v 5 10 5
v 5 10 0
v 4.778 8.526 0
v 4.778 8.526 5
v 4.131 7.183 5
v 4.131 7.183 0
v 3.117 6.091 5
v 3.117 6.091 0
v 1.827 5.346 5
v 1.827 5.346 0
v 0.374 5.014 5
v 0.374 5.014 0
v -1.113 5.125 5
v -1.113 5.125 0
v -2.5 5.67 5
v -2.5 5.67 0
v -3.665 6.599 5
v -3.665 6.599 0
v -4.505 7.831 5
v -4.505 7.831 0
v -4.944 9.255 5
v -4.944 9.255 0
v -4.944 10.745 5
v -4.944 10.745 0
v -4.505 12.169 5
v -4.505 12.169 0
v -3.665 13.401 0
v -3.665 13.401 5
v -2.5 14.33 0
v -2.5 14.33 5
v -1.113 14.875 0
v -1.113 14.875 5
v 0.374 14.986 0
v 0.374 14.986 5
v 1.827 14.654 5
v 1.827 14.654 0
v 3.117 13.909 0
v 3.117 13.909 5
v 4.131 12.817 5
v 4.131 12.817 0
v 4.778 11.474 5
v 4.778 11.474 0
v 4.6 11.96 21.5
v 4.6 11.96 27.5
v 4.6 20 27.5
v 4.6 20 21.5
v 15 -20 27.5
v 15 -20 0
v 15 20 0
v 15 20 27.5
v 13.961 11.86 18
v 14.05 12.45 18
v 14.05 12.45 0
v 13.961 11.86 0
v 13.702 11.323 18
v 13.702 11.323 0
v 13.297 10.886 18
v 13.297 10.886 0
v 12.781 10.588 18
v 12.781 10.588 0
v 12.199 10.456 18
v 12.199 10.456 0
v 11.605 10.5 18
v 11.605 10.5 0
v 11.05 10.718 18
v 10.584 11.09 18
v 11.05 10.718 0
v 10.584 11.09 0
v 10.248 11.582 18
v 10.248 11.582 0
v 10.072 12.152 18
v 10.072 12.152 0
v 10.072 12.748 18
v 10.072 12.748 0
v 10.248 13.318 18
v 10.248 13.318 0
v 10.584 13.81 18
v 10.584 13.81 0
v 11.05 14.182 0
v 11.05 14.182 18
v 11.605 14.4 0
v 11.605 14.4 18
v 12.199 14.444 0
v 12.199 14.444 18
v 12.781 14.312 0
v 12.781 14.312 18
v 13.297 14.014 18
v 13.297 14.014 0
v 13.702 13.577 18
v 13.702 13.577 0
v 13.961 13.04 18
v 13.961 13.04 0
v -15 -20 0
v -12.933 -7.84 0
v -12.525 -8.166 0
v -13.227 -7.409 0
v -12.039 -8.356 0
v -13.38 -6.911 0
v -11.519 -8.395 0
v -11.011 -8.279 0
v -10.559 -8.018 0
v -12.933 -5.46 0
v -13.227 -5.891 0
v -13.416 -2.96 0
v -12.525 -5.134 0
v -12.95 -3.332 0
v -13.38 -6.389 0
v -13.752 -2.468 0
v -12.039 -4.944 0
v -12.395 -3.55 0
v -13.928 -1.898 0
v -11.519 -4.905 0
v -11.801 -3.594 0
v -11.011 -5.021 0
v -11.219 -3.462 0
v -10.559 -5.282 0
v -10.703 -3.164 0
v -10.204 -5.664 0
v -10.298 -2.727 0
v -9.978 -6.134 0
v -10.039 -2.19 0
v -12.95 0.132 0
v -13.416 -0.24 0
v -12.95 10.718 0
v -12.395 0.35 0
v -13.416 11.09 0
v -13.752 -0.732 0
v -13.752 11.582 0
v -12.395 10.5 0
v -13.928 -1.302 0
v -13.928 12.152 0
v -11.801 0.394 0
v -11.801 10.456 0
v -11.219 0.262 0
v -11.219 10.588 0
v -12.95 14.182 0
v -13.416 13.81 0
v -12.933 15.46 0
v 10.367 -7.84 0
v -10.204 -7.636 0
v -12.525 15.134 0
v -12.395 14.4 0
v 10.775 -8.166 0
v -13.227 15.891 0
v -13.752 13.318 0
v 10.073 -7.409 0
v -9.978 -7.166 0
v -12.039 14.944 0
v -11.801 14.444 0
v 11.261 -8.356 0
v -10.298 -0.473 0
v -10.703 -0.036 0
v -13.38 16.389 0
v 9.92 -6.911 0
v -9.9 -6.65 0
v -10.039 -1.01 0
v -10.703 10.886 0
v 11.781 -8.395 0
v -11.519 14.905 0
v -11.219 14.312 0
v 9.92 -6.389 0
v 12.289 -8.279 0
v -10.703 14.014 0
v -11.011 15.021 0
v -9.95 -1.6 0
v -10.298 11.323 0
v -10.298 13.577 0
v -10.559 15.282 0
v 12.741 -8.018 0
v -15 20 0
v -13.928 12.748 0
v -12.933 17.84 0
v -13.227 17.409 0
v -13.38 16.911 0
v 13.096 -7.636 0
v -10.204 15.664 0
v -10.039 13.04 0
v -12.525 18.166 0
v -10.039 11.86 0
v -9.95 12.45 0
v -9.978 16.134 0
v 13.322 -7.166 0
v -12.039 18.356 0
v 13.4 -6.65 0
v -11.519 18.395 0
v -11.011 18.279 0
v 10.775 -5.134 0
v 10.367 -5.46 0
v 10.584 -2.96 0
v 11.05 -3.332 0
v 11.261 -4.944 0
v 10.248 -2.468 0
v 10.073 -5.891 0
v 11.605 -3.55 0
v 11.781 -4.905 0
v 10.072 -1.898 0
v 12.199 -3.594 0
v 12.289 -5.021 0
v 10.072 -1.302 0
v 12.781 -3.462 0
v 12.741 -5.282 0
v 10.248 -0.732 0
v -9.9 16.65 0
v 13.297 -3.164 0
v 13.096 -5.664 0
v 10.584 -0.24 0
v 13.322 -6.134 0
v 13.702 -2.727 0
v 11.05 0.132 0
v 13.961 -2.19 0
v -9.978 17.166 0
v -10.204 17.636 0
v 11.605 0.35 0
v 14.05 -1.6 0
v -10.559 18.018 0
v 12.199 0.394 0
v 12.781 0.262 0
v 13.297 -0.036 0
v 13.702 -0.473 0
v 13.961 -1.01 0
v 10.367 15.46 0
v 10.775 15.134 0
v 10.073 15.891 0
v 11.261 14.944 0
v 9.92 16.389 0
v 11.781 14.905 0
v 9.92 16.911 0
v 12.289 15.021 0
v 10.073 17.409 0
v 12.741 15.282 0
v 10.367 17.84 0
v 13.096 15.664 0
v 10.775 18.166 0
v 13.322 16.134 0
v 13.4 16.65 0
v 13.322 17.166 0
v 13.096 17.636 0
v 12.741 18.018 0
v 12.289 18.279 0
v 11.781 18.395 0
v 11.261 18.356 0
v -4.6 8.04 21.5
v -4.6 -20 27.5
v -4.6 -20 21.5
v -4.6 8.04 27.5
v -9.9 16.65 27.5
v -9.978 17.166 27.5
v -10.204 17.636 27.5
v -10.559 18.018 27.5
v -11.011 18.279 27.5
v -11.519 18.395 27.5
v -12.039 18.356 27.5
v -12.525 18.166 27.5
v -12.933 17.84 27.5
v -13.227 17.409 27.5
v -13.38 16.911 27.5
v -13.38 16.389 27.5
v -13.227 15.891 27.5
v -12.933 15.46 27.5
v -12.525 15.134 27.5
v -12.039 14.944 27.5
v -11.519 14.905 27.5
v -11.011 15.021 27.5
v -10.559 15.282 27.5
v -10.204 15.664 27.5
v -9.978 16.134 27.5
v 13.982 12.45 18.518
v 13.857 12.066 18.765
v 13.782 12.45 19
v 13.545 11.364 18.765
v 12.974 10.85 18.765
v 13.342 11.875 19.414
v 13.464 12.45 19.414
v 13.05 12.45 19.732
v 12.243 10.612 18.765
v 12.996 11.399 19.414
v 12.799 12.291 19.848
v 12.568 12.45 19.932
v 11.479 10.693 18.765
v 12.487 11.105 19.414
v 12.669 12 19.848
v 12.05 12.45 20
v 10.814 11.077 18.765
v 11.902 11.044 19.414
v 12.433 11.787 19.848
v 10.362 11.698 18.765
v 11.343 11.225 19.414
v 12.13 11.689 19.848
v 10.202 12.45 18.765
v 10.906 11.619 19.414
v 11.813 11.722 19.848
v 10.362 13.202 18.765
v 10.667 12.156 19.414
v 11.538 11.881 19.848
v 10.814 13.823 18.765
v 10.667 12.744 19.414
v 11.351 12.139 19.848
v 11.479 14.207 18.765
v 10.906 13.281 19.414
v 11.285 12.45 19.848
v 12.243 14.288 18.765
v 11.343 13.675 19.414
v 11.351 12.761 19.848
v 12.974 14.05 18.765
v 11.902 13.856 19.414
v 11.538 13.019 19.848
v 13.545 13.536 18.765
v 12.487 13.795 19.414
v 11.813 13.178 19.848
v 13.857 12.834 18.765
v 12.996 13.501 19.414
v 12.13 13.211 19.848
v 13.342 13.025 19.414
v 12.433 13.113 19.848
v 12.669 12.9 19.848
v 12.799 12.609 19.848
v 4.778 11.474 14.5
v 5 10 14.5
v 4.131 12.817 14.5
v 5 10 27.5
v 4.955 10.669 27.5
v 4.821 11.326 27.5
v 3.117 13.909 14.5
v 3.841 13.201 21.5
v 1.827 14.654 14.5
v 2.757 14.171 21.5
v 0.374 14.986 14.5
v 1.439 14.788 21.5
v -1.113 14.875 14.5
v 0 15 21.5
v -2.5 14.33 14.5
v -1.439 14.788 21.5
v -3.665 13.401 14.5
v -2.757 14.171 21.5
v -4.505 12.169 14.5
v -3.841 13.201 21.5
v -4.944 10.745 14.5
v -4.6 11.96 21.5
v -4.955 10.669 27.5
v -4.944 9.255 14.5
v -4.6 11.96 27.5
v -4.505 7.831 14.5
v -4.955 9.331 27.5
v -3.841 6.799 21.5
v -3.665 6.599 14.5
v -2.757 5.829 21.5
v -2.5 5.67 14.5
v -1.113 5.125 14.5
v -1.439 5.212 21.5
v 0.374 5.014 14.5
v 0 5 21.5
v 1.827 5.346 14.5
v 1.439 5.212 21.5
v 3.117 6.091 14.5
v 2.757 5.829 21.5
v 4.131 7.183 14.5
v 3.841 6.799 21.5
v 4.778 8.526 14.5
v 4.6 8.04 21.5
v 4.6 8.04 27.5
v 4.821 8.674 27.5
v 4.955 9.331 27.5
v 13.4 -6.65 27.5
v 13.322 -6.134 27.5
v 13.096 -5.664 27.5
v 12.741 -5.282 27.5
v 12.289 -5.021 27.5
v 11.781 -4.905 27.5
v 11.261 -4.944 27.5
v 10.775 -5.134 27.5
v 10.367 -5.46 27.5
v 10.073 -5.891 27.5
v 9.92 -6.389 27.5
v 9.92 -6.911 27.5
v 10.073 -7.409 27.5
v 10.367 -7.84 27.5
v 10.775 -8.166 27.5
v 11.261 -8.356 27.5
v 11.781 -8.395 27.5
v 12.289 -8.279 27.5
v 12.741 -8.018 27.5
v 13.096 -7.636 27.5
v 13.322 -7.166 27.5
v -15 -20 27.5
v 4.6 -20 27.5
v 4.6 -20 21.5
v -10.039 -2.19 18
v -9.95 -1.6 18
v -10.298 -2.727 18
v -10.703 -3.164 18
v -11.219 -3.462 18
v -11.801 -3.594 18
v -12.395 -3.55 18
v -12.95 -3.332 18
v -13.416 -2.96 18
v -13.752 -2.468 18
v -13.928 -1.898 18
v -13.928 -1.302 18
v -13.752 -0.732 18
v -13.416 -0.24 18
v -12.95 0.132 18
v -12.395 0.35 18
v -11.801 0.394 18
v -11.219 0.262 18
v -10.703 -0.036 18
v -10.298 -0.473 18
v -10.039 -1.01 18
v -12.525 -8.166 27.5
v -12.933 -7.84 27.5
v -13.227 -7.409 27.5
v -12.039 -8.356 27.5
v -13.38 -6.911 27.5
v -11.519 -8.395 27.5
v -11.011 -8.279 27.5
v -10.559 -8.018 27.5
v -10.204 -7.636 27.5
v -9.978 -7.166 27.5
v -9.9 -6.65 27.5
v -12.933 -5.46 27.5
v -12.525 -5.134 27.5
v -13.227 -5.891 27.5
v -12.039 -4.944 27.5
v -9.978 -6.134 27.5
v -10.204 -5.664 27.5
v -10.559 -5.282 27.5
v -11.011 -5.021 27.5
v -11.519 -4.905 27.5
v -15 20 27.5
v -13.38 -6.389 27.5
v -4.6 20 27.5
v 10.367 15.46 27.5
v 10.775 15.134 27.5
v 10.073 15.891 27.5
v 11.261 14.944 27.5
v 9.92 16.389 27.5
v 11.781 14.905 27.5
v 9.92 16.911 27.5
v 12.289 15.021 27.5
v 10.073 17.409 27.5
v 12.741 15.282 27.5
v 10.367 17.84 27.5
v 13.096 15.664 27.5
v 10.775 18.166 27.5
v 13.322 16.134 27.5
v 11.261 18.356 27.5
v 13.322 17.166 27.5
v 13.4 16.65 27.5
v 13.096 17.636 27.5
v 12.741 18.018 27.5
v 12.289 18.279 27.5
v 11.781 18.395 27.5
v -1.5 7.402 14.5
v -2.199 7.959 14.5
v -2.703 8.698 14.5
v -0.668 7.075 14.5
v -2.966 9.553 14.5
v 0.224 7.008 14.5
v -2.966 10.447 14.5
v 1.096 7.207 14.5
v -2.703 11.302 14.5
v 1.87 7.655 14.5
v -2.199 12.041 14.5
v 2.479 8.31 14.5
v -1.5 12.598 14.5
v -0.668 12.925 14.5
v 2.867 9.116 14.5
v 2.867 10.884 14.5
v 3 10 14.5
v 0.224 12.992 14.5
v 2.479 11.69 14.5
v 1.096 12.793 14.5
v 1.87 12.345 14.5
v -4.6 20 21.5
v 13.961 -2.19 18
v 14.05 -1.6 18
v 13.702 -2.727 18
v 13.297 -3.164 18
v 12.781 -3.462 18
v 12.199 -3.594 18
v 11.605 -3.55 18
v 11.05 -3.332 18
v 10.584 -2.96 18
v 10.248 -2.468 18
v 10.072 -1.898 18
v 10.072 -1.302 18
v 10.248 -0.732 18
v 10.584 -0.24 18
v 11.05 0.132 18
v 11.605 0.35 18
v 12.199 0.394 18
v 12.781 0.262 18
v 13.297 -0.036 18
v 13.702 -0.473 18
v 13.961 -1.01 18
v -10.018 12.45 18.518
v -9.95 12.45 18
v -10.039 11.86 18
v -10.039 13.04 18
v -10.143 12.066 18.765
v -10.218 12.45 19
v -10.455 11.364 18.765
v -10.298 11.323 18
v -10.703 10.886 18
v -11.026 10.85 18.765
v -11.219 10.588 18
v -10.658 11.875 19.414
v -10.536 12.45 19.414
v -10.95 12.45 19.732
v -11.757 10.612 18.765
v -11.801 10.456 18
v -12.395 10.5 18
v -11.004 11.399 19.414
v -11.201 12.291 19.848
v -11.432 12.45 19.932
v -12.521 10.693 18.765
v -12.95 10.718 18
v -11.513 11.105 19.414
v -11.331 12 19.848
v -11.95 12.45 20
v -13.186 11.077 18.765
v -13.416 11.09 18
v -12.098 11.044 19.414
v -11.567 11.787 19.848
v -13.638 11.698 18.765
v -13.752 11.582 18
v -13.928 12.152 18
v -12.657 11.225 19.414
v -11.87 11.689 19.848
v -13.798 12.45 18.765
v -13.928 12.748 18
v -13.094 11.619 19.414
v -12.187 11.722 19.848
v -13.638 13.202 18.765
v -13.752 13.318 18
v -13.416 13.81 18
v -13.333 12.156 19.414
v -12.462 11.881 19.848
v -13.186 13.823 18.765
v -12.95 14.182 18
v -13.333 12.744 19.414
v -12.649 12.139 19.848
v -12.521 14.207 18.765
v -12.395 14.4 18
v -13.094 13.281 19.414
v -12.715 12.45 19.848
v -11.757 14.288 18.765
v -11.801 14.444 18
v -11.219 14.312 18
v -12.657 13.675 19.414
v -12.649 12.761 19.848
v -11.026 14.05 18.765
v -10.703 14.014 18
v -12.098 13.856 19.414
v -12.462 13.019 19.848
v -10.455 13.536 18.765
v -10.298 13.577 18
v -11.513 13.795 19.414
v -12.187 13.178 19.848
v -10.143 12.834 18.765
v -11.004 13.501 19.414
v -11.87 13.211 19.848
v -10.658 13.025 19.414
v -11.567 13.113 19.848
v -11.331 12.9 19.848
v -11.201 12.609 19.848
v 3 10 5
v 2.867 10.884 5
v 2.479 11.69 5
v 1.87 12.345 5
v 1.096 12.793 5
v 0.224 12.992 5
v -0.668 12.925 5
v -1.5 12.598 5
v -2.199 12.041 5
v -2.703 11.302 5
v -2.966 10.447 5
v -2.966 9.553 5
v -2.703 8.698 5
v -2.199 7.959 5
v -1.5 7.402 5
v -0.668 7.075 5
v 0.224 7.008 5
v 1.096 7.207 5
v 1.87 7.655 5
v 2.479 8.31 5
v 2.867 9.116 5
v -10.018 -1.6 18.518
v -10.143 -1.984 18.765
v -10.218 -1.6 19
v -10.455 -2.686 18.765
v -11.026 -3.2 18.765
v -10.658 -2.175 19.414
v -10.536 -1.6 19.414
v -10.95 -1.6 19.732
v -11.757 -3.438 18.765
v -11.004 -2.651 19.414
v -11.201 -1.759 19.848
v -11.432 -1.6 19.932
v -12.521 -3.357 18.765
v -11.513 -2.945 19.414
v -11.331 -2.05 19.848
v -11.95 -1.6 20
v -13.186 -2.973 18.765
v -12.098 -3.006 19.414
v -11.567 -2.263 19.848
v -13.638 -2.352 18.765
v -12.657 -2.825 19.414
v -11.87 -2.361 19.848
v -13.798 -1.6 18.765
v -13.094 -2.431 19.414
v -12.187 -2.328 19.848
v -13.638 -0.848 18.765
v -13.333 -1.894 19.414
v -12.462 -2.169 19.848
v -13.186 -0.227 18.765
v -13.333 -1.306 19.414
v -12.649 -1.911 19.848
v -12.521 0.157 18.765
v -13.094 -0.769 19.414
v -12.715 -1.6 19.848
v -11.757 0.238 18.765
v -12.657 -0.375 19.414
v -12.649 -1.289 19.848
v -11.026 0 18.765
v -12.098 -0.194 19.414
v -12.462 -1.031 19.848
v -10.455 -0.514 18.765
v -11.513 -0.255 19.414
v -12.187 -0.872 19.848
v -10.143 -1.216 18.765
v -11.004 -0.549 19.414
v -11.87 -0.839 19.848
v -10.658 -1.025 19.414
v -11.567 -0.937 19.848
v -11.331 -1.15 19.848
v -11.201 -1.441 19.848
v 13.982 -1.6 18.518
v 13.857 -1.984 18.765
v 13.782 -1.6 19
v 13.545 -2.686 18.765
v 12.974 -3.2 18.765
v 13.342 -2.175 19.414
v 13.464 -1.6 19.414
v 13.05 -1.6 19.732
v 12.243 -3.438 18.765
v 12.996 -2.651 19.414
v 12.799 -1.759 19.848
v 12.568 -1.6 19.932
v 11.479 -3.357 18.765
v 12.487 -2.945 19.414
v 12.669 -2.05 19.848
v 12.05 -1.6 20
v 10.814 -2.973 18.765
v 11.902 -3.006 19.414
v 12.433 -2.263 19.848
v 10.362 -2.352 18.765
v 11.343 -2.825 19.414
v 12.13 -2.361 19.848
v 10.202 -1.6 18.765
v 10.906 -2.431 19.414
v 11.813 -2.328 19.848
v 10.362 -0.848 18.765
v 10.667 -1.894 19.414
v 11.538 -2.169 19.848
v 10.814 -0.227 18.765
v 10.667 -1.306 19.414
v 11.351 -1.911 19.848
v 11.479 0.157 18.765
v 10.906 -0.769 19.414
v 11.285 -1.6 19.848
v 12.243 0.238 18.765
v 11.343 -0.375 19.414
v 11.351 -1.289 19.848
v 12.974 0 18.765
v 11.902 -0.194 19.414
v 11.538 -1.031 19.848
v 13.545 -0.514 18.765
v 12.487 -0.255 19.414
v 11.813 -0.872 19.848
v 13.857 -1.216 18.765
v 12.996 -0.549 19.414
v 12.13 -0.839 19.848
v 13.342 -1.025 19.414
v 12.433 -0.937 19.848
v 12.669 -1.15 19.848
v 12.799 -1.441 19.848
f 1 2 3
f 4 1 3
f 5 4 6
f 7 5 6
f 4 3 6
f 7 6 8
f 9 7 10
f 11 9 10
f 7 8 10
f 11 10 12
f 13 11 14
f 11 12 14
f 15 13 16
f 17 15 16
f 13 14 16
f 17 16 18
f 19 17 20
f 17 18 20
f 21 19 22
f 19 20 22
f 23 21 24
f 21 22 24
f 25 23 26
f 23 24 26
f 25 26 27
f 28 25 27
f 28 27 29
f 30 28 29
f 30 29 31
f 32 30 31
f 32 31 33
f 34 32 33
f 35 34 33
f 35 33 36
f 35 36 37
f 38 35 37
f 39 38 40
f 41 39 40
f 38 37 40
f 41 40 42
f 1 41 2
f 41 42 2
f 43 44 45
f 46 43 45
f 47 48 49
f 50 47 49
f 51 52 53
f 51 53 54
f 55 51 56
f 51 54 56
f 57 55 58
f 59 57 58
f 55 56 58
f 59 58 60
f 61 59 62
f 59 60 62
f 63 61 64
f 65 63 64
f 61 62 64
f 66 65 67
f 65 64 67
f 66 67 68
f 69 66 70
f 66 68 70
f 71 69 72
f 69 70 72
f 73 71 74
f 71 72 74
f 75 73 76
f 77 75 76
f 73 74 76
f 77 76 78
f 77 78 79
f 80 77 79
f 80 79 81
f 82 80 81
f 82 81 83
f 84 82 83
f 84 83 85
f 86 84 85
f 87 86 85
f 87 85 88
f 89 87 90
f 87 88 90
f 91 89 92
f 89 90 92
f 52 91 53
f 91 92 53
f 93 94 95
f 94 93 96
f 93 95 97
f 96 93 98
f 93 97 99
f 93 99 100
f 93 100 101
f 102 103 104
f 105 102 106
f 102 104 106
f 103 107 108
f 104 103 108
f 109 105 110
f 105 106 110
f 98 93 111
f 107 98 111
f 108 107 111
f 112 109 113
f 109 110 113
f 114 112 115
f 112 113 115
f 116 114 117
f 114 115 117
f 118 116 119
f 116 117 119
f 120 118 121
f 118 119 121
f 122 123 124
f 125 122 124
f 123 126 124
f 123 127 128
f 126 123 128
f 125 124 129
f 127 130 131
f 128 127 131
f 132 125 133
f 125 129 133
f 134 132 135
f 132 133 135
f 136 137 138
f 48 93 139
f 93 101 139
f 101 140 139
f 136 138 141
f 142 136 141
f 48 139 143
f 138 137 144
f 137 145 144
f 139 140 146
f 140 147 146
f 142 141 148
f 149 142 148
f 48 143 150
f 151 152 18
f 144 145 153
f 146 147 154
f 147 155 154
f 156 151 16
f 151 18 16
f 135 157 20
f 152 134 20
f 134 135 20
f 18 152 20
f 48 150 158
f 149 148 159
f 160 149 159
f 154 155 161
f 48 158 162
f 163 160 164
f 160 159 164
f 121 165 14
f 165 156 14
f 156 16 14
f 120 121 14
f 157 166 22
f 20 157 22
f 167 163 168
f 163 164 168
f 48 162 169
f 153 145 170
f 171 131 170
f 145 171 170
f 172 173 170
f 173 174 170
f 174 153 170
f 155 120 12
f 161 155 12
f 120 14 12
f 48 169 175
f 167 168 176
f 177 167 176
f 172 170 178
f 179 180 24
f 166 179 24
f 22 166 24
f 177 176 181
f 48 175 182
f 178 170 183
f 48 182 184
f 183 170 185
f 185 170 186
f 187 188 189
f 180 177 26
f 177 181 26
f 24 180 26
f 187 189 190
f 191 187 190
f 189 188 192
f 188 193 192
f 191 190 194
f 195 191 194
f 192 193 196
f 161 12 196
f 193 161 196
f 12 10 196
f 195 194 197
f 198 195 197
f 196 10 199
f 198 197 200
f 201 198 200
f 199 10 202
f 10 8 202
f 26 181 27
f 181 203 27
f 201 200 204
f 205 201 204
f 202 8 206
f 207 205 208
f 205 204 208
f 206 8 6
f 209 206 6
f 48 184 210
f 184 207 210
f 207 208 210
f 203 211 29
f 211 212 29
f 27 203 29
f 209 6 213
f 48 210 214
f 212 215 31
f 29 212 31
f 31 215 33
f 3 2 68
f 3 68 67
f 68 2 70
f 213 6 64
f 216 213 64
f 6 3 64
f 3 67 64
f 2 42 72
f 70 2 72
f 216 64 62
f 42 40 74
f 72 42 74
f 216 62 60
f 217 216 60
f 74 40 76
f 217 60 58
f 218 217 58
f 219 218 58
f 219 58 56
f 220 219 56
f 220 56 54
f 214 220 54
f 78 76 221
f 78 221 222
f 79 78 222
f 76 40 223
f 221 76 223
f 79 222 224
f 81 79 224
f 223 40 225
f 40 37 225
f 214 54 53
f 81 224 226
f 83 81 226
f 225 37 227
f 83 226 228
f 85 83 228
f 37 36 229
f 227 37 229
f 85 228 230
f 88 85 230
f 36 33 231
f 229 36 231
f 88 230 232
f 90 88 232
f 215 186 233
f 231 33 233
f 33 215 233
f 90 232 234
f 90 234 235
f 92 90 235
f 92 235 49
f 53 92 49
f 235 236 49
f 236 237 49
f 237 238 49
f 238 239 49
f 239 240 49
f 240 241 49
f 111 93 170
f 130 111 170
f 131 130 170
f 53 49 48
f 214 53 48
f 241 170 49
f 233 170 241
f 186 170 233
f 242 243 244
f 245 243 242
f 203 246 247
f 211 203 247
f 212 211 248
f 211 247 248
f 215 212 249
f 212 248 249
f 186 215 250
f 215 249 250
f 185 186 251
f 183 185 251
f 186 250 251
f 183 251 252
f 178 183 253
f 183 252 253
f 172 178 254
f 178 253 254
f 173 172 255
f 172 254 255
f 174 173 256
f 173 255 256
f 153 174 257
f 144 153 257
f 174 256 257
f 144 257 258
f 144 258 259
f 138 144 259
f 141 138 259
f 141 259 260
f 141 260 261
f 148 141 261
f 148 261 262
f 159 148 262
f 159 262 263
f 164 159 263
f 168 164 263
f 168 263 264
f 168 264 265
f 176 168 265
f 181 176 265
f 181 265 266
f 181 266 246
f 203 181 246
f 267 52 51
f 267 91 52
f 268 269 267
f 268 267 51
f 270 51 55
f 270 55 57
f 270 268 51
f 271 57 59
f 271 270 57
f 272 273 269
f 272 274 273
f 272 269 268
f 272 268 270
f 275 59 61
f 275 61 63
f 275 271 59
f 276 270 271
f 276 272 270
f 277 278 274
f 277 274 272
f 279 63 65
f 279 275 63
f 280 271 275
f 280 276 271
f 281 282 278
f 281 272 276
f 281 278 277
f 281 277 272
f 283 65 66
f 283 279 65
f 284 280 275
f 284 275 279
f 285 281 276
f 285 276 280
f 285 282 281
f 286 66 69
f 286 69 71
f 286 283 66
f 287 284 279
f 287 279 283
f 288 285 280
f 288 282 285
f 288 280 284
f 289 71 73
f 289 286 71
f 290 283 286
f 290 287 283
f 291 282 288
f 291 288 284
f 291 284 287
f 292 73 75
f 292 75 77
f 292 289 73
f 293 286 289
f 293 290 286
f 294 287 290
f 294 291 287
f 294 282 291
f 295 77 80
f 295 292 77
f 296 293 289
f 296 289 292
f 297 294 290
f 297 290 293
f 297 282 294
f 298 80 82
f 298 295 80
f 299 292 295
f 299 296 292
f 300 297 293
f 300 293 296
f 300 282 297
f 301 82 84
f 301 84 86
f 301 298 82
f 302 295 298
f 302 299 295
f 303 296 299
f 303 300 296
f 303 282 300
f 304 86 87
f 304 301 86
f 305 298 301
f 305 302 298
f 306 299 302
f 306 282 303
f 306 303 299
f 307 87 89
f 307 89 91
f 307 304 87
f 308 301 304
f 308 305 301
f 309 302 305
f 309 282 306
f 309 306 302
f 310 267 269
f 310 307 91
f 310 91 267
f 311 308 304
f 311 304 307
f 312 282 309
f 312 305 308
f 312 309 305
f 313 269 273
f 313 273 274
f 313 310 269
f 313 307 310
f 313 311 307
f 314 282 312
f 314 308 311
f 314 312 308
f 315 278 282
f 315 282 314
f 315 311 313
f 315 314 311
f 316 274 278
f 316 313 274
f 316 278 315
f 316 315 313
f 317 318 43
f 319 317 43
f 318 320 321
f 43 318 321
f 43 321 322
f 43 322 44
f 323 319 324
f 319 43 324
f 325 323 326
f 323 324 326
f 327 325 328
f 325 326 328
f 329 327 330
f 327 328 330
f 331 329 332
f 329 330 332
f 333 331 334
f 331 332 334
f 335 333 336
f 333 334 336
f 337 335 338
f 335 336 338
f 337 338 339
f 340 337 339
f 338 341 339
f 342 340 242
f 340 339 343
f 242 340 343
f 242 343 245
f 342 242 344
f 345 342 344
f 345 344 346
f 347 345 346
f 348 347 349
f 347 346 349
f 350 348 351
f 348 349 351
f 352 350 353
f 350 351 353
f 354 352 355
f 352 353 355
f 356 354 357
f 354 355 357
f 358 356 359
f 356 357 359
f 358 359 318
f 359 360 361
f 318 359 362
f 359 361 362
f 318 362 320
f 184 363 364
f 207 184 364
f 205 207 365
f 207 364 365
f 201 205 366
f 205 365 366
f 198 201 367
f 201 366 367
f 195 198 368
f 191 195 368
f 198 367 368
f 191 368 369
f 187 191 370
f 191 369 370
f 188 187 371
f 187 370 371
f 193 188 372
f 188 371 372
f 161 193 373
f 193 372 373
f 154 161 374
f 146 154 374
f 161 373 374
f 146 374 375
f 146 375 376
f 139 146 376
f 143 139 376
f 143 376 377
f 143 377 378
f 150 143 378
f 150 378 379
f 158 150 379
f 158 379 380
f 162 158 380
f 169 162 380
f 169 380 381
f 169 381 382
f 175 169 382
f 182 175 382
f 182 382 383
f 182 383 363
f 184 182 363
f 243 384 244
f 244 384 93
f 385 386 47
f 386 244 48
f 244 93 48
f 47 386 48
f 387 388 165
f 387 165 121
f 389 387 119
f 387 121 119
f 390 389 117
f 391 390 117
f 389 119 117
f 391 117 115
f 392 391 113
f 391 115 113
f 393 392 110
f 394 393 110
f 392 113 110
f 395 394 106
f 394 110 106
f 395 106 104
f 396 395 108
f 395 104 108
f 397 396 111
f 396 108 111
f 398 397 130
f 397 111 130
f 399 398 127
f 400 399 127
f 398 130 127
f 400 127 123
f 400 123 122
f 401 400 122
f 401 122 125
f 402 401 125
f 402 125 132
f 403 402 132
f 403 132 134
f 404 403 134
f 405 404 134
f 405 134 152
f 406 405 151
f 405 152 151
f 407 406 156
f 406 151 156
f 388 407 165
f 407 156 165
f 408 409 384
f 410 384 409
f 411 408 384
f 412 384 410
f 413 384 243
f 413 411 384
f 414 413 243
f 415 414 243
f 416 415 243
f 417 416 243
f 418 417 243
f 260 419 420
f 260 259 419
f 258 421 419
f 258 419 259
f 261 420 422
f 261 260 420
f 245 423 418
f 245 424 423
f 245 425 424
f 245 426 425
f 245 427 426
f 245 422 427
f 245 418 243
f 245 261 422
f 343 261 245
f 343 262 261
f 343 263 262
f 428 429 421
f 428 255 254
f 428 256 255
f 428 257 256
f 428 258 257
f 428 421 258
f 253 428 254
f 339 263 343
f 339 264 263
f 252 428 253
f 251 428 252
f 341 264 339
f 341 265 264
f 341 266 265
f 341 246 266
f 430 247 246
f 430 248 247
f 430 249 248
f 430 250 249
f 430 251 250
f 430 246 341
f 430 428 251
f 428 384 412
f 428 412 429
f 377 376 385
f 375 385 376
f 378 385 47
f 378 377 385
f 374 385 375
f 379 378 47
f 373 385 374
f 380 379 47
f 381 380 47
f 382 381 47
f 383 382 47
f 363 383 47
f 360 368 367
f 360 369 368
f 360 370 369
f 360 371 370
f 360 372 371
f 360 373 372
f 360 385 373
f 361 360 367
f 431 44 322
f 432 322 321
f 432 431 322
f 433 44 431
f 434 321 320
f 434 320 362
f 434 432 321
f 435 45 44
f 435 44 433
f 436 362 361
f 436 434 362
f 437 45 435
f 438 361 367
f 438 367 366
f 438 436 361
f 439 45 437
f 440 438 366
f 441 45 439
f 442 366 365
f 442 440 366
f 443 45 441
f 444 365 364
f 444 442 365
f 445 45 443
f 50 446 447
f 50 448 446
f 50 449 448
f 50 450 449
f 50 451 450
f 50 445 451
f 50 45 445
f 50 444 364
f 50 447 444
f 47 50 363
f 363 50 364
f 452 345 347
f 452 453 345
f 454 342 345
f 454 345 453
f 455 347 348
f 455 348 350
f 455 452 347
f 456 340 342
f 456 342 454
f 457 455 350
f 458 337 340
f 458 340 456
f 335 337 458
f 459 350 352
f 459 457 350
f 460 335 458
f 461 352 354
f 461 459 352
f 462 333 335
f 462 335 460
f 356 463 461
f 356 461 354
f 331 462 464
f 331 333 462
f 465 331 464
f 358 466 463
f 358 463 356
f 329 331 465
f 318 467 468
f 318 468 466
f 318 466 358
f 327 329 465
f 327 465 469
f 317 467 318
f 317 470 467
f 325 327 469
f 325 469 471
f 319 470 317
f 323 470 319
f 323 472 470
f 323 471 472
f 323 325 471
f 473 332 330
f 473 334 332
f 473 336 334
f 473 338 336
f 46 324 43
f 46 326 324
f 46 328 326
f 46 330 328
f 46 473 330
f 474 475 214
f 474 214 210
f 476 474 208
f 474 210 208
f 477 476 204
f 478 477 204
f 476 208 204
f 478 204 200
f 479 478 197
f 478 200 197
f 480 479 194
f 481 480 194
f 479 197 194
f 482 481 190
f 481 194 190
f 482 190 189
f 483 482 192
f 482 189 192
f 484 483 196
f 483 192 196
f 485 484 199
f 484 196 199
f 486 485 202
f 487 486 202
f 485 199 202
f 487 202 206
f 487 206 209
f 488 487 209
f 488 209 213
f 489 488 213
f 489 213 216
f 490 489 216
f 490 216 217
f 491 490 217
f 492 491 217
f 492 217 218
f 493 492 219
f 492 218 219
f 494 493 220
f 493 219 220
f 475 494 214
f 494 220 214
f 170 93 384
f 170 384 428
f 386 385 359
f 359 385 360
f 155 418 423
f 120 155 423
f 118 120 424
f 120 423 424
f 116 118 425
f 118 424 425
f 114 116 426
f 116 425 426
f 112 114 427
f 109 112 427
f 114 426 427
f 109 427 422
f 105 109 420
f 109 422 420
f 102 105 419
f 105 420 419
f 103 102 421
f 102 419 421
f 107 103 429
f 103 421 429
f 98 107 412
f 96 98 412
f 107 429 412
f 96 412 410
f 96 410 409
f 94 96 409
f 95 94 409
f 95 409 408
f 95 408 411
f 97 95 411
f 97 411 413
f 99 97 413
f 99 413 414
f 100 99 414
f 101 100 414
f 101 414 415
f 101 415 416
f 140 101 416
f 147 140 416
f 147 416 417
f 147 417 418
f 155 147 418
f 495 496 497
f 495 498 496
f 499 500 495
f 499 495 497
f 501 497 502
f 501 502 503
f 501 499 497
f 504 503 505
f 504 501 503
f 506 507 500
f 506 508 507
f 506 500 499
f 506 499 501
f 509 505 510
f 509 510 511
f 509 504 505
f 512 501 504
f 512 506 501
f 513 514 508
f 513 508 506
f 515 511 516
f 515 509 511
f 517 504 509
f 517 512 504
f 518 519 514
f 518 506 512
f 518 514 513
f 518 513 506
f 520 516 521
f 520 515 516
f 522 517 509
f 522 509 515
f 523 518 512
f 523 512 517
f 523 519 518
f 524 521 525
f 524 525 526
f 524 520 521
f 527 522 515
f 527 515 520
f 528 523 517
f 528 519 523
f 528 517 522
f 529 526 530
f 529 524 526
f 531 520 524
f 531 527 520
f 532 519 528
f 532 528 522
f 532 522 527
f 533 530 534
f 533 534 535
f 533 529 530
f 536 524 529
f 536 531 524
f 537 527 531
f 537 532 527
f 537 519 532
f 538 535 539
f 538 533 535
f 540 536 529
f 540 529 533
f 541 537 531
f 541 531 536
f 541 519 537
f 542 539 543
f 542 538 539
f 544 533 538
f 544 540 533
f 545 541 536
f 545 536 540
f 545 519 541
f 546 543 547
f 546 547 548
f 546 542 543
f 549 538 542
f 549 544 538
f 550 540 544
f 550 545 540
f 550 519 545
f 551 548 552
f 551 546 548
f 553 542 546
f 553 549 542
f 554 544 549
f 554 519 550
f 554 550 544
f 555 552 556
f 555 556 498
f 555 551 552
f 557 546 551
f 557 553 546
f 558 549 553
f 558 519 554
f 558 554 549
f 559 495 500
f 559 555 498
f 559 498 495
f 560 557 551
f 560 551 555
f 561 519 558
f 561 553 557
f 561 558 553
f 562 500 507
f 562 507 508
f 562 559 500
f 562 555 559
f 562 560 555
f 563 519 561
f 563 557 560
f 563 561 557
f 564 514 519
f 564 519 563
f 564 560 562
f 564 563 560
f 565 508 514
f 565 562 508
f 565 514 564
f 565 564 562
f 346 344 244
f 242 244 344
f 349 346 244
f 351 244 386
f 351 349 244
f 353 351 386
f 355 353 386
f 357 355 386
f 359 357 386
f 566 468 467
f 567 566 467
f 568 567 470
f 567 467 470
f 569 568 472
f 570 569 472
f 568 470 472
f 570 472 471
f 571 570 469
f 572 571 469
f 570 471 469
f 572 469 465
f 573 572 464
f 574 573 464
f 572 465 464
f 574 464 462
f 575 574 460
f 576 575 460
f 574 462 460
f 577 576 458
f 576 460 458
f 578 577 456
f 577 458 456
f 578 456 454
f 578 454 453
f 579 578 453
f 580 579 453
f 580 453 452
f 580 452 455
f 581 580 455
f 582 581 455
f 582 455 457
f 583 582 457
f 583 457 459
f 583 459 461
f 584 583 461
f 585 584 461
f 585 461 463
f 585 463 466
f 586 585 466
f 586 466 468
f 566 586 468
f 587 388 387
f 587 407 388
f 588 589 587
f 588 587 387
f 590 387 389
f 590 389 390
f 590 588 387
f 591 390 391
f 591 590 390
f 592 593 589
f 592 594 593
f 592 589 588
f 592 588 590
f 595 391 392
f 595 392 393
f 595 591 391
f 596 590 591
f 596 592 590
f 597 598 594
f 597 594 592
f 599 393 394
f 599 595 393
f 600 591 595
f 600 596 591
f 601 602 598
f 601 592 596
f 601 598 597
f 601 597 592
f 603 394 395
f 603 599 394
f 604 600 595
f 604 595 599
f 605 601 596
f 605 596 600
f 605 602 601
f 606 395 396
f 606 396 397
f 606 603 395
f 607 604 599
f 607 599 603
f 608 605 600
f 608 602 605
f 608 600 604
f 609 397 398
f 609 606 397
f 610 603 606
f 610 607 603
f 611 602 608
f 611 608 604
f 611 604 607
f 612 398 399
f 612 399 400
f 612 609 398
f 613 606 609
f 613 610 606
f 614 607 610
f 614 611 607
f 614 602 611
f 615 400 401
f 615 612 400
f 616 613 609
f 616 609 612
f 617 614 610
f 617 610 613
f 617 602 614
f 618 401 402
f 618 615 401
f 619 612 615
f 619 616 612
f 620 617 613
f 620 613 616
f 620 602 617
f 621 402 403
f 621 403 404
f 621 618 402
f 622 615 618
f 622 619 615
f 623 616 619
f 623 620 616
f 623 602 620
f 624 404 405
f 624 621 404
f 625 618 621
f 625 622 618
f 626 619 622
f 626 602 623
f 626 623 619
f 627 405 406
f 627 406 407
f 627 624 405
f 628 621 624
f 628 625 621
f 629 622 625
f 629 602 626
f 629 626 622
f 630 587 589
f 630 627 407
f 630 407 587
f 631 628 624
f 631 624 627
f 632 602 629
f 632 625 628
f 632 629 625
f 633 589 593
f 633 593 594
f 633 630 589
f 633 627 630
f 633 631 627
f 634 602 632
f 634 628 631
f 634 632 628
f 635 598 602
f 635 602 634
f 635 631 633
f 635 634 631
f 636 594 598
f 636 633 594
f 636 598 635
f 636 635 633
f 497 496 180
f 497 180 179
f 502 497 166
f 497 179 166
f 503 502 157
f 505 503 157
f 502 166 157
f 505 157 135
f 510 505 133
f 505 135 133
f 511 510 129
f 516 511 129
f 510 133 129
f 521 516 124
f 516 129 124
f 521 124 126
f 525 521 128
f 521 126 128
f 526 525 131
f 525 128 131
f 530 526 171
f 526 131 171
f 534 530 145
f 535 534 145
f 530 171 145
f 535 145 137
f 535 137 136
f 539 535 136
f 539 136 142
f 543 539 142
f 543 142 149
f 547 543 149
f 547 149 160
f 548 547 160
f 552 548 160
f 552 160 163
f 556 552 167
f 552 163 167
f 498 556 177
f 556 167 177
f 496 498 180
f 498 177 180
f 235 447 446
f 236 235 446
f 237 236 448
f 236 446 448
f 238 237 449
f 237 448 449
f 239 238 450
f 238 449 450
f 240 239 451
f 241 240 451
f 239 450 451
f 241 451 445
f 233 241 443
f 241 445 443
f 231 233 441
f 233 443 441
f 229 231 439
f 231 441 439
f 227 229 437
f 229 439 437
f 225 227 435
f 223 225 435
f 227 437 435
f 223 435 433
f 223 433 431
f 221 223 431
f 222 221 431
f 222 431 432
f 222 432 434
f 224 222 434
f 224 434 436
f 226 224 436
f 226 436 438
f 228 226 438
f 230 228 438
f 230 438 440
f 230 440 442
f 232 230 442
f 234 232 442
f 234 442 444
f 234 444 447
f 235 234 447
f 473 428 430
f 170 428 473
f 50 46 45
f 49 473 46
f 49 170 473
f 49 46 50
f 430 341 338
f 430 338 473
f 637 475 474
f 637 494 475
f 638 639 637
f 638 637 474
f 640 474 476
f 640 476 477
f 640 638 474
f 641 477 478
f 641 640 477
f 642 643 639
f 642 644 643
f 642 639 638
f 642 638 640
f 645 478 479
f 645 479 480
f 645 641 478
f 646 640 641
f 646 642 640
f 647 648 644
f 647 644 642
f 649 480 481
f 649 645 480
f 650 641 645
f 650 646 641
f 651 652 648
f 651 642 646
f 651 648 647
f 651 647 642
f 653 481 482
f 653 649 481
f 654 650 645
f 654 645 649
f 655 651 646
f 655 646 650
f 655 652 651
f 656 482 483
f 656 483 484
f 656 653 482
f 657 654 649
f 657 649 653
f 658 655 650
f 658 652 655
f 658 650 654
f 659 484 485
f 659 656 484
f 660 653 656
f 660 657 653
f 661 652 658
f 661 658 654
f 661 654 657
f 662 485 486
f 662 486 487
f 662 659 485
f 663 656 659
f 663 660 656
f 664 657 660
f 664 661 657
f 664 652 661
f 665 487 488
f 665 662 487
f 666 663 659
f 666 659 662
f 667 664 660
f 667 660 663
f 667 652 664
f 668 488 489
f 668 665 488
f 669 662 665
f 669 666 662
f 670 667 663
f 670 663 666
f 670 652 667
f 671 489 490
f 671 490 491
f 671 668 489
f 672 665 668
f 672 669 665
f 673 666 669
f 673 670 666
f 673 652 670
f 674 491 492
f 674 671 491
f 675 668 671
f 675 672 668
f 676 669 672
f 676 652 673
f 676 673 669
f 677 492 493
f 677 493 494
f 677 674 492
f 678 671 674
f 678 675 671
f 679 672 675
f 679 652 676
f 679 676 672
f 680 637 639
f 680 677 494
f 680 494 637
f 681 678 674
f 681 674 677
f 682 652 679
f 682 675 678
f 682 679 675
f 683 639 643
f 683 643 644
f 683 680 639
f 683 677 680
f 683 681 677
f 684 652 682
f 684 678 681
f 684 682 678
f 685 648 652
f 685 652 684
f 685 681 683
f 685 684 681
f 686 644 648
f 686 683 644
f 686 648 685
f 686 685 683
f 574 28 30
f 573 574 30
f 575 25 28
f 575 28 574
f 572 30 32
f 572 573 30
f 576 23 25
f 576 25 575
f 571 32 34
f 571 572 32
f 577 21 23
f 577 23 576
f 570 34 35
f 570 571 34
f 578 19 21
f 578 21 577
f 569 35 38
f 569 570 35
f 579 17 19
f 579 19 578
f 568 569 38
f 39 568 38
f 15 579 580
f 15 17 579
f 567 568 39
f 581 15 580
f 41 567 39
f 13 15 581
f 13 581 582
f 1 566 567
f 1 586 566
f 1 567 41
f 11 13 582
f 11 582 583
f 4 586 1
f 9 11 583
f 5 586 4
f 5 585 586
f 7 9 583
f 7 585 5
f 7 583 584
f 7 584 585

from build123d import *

# Parameters (mm, degrees)
F0_W      = 30
F0_H      = 40
F1_DEPTH  = 27.5
F2_W      = 9.2
F2_H      = 40
F3_DEPTH  = 6
F4_R      = 1.75
F5_DEPTH  = 27.501
F6_R      = 3
F7_DEPTH  = 21.501
F8_R      = 5
F9_DEPTH  = 13
F10_R     = 5
F11_DEPTH = 5
F12_R     = 2
F13_DEPTH = 20
F14_R     = 2


with BuildPart() as f1:
    # F0 (on Top) → F1 (new body)
    with BuildSketch(Plane.XY):
        Rectangle(F0_W, F0_H)
    extrude(amount=F1_DEPTH)

    # F2 (on face) → F3 (cut)
    with BuildSketch(Plane.XY.offset(27.5)):
        Rectangle(F2_W, F2_H)
    extrude(amount=-F3_DEPTH, mode=Mode.SUBTRACT)

    # F4 (on face) → F5 (cut, through all)
    with BuildSketch(Plane.XY.offset(27.5)):
        with Locations((-11.65, 16.65)):
            Circle(F4_R)
        with Locations((-11.65, -6.65)):
            Circle(F4_R)
        with Locations((11.65, 16.65)):
            Circle(F4_R)
        with Locations((11.65, -6.65)):
            Circle(F4_R)
    extrude(amount=-F5_DEPTH, mode=Mode.SUBTRACT)

    # F6 (on face) → F7 (cut, through all)
    with BuildSketch(Plane.XY.offset(21.5)):
        with Locations((0, 10)):
            Circle(F6_R)
    extrude(amount=-F7_DEPTH, mode=Mode.SUBTRACT)

    # F8 (on face) → F9 (cut)
    with BuildSketch(Plane.XY.offset(27.5)):
        with Locations((0, 10)):
            Circle(F8_R)
    extrude(amount=-F9_DEPTH, mode=Mode.SUBTRACT)

    # F10 (on face) → F11 (cut)
    with BuildSketch(Plane(origin=(0, 0, 0), x_dir=(1, 0, 0), z_dir=(0, 0, -1))):
        with Locations((0, -10)):
            Circle(F10_R)
    extrude(amount=-F11_DEPTH, mode=Mode.SUBTRACT)

    # F12 (on face) → F13 (cut)
    with BuildSketch(Plane(origin=(0, 0, 0), x_dir=(1, 0, 0), z_dir=(0, 0, -1))):
        with Locations((-11.95, 1.6)):
            Circle(F12_R)
        with Locations((-11.95, -12.45)):
            Circle(F12_R)
        with Locations((12.05, 1.6)):
            Circle(F12_R)
        with Locations((12.05, -12.45)):
            Circle(F12_R)
    extrude(amount=-F13_DEPTH, mode=Mode.SUBTRACT)

    # F14
    f14_edges = [f1.edges().sort_by_distance(p)[0] for p in [
        (-13.95, -1.6, 20),
        (-13.95, 12.45, 20),
        (10.05, -1.6, 20),
        (10.05, 12.45, 20),
    ]]
    fillet(f14_edges, radius=F14_R)


solid = f1.part
